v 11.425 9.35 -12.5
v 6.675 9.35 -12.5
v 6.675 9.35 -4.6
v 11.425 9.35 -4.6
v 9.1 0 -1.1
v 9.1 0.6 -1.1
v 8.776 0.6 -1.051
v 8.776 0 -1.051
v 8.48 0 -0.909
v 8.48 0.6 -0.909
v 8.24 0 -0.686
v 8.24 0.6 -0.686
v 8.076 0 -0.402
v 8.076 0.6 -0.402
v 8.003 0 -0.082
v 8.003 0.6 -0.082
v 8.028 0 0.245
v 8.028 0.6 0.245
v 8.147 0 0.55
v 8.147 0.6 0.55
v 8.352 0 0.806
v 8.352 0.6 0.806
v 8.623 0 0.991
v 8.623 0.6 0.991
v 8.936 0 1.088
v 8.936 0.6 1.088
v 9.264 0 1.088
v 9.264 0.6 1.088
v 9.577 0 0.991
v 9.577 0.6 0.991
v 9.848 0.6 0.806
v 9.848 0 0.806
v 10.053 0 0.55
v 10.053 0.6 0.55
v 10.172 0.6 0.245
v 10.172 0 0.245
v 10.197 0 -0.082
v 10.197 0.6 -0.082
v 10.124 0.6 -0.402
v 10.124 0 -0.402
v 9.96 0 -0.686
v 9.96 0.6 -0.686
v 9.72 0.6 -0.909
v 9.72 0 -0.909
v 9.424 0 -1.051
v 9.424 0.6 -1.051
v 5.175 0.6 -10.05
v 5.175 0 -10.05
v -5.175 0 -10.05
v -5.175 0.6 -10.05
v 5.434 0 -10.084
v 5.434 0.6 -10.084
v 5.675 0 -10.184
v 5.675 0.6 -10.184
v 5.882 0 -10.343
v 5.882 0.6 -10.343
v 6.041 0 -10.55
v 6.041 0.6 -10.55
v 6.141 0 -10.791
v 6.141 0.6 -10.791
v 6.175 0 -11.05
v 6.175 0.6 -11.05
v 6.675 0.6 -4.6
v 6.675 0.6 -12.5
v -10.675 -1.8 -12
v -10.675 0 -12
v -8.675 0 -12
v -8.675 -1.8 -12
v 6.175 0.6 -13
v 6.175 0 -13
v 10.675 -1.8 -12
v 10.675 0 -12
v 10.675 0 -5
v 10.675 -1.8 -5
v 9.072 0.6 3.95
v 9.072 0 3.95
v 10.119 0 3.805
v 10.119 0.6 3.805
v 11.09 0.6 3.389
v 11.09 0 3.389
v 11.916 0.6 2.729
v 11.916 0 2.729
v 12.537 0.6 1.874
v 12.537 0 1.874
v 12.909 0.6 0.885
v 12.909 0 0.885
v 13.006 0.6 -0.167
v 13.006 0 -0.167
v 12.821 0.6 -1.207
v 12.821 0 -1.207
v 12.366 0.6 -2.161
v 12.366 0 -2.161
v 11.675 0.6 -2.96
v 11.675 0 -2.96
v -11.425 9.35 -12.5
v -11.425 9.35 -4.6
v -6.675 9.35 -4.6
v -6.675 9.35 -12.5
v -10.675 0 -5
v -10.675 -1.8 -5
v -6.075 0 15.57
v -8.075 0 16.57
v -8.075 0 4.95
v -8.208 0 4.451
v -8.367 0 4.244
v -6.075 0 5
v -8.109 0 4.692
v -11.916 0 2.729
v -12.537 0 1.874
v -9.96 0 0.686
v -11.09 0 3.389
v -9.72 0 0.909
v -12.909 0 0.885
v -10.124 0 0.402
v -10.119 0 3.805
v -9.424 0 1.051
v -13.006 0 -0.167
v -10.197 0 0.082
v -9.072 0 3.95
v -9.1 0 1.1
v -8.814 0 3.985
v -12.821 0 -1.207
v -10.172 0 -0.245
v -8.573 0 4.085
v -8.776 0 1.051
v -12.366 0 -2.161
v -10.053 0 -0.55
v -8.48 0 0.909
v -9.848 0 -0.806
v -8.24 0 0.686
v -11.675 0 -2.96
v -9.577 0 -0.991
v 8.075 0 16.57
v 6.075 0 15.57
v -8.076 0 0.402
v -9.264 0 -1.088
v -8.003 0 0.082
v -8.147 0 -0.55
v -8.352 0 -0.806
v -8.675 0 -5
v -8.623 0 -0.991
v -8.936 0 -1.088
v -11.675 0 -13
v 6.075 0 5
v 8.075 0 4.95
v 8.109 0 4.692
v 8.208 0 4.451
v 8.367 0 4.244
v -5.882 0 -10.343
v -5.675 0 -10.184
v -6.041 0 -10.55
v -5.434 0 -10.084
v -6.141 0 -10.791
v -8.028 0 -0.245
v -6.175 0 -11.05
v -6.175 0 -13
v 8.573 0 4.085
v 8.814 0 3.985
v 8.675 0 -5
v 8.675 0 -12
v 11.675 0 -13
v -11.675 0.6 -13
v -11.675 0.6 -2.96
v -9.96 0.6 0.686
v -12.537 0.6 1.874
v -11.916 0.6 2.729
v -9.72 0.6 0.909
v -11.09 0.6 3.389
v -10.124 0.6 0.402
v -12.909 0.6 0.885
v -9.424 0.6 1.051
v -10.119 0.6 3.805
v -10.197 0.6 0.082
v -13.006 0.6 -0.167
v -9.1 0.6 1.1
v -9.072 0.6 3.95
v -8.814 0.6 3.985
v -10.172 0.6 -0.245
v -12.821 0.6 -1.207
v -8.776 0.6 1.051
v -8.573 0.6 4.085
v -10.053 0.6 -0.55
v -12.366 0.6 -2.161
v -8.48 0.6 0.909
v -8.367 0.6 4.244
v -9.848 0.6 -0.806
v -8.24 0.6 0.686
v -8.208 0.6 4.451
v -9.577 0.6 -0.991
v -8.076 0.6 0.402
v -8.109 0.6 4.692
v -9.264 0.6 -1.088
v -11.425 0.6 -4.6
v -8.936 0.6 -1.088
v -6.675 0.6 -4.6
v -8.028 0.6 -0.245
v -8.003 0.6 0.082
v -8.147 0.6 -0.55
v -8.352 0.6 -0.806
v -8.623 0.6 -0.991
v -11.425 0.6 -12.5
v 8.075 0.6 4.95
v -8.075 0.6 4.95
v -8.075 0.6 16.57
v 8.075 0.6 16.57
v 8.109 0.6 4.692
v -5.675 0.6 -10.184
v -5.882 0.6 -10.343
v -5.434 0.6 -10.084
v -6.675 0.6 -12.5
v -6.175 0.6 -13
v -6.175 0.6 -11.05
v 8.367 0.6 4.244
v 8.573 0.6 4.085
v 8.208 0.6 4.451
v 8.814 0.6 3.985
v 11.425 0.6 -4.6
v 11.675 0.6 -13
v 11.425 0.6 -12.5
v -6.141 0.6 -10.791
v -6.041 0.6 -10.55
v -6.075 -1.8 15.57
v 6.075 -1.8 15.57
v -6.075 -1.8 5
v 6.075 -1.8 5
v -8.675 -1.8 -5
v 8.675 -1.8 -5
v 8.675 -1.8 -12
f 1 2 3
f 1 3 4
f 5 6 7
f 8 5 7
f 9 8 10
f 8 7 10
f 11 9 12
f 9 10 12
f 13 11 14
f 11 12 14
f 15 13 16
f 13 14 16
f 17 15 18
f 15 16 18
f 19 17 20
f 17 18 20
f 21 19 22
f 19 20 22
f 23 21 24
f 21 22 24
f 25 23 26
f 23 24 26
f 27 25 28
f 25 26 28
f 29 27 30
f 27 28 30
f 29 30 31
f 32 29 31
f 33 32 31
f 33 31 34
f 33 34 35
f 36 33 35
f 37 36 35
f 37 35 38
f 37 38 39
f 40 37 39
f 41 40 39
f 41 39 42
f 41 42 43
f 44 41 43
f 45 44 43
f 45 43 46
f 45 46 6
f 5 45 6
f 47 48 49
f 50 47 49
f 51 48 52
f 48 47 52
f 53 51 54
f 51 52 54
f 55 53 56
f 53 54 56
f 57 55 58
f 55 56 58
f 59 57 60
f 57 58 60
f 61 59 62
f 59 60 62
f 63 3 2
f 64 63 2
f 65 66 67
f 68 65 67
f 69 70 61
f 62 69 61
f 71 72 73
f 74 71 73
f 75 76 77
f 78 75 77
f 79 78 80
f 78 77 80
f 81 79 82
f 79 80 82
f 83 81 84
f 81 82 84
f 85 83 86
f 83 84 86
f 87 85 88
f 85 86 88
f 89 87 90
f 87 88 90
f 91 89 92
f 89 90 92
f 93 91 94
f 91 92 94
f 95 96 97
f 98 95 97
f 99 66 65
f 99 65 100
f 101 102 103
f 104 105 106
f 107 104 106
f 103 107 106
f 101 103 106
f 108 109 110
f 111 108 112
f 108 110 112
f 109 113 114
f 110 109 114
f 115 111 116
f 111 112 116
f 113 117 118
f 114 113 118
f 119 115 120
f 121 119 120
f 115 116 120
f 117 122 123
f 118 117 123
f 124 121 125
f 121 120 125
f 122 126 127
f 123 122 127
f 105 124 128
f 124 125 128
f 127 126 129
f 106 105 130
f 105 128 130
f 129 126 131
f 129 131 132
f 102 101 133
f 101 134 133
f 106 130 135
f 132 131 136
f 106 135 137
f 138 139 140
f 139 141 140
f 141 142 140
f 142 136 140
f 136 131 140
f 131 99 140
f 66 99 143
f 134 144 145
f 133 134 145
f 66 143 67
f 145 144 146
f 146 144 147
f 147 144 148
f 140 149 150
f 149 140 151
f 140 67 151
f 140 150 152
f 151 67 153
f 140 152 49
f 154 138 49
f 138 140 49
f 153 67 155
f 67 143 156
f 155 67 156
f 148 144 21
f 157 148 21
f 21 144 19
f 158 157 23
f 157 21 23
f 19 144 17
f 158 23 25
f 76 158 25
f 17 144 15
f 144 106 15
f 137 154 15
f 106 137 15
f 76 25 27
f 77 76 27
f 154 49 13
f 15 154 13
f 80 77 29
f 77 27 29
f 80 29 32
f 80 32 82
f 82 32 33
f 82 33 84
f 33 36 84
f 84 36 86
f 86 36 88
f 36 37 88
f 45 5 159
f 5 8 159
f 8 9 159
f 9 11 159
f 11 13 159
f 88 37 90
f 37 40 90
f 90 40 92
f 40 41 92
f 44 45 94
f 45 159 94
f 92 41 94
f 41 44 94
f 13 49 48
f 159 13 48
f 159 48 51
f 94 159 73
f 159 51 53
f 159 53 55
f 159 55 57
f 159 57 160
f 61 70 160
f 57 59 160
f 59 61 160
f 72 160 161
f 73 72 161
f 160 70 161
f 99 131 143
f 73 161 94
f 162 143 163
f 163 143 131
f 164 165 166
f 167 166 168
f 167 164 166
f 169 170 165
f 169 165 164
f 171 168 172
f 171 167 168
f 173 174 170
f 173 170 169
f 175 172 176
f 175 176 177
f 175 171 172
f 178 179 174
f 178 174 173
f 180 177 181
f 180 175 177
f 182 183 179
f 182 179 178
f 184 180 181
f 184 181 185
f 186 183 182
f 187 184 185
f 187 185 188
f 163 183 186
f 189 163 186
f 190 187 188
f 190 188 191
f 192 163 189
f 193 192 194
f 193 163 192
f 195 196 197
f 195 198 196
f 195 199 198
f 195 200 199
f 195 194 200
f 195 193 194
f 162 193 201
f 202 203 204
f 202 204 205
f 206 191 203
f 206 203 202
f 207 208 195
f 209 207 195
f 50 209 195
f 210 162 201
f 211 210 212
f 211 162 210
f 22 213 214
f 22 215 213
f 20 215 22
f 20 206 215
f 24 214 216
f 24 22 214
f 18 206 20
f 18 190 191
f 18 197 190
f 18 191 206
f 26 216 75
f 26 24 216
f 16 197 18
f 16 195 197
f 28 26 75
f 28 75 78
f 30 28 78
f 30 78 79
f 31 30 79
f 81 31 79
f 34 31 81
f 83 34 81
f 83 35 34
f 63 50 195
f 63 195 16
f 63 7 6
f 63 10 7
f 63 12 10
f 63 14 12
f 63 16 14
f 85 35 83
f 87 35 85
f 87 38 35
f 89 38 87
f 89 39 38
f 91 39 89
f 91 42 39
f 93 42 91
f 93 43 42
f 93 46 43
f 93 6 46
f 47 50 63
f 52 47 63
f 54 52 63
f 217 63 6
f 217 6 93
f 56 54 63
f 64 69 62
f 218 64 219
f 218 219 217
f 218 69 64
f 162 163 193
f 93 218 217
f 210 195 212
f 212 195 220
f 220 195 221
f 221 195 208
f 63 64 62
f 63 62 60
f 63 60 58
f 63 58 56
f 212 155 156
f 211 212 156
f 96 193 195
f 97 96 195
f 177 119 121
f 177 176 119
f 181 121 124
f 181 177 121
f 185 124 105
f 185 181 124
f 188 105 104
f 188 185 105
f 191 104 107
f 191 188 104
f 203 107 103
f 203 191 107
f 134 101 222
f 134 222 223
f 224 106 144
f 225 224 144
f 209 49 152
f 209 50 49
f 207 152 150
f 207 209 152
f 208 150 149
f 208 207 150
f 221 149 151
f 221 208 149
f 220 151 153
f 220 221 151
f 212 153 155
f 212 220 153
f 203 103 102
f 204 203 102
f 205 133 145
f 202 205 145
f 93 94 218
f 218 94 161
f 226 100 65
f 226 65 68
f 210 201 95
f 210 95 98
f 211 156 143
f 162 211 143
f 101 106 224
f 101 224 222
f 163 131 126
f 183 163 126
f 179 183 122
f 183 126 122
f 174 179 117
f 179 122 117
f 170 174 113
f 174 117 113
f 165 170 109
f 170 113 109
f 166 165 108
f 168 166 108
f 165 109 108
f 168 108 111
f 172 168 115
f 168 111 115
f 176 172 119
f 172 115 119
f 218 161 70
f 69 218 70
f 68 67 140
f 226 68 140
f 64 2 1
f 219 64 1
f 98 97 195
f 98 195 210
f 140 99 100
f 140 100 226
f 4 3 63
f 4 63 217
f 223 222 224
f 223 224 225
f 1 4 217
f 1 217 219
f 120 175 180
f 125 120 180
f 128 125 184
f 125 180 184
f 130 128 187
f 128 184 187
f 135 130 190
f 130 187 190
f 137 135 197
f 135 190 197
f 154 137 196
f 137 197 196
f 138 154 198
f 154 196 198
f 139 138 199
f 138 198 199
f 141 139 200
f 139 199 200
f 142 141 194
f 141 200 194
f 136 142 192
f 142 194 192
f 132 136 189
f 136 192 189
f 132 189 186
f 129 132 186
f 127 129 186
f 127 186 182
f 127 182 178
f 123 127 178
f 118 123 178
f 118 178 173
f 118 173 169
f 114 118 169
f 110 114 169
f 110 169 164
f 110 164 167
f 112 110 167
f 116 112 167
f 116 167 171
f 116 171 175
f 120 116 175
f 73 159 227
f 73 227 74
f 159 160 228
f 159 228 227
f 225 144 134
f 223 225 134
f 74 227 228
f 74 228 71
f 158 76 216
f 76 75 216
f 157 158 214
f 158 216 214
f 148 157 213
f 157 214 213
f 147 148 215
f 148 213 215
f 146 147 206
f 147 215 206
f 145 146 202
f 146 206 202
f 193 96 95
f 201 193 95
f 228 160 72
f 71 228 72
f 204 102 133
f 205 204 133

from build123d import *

# Parameters (mm, degrees)
BOSS_EXTRUDE1_DEPTH = 0.6
SKETCH2_R           = 1.1
CUT_EXTRUDE1_DEPTH  = 22.075696904
SKETCH3_W           = 12.15
SKETCH3_H           = 10.57
SKETCH3_W_2         = 2
SKETCH3_H_2         = 7
BOSS_EXTRUDE2_DEPTH = 1.8
SKETCH4_W           = 4.75
SKETCH4_H           = 7.9
BOSS_EXTRUDE3_DEPTH = 8.75
FILLET1_R           = 1


with BuildPart() as part:
    # Sketch1 → Boss-Extrude1 (new body)
    with BuildSketch(Plane(origin=(0, 0, 0), x_dir=(1, 0, 0), z_dir=(0, 1, 0))):
        with BuildLine():
            Line((6.175, 10.05), (-6.175, 10.05))
            Line((-6.175, 10.05), (-6.175, 13))
            Line((-6.175, 13), (-11.675, 13))
            Line((-11.675, 13), (-11.675, 2.960451824))
            ThreePointArc((-11.675, 2.960451824), (-12.549347485, -1.851203428), (-8.075, -3.82521568))
            Line((-8.075, -3.82521568), (-8.075, -16.57))
            Line((-8.075, -16.57), (8.075, -16.57))
            Line((8.075, -16.57), (8.075, -3.82521568))
            ThreePointArc((8.075, -3.82521568), (12.549347485, -1.851203428), (11.675, 2.960451824))
            Line((11.675, 2.960451824), (11.675, 13))
            Line((11.675, 13), (6.175, 13))
            Line((6.175, 13), (6.175, 10.05))
        make_face()
    extrude(amount=BOSS_EXTRUDE1_DEPTH)

    # Sketch2 → Cut-Extrude1 (cut, through all)
    with BuildSketch(Plane(origin=(0, 0.6, 0), x_dir=(1, 0, 0), z_dir=(0, 1, 0))):
        with Locations(Location((-9.1, 0, 0), (0, 0, 270))):
            Circle(SKETCH2_R)
        with Locations(Location((9.1, 0, 0), (0, 0, 90))):
            Circle(SKETCH2_R)
    extrude(amount=-CUT_EXTRUDE1_DEPTH, mode=Mode.SUBTRACT)

    # Sketch3 → Boss-Extrude2 (add)
    with BuildSketch(Plane.XZ):
        with Locations((0, 10.285)):
            Rectangle(SKETCH3_W, SKETCH3_H)
        with Locations((-9.675, -8.5)):
            Rectangle(SKETCH3_W_2, SKETCH3_H_2)
        with Locations((9.675, -8.5)):
            Rectangle(SKETCH3_W_2, SKETCH3_H_2)
    extrude(amount=BOSS_EXTRUDE2_DEPTH)

    # Sketch4 → Boss-Extrude3 (add)
    with BuildSketch(Plane(origin=(0, 0.6, 0), x_dir=(1, 0, 0), z_dir=(0, 1, 0))):
        with Locations((-9.05, 8.55)):
            Rectangle(SKETCH4_W, SKETCH4_H)
        with Locations((9.05, 8.55)):
            Rectangle(SKETCH4_W, SKETCH4_H)
    extrude(amount=BOSS_EXTRUDE3_DEPTH)

    # Fillet1
    fillet1_edges = [part.edges().sort_by_distance(p)[0] for p in [
        (-6.175, 0.3, -10.05),
        (6.175, 0.3, -10.05),
        (8.075, 0.3, 3.82521568),
        (-8.075, 0.3, 3.82521568),
    ]]
    fillet(fillet1_edges, radius=FILLET1_R)


solid = part.part
